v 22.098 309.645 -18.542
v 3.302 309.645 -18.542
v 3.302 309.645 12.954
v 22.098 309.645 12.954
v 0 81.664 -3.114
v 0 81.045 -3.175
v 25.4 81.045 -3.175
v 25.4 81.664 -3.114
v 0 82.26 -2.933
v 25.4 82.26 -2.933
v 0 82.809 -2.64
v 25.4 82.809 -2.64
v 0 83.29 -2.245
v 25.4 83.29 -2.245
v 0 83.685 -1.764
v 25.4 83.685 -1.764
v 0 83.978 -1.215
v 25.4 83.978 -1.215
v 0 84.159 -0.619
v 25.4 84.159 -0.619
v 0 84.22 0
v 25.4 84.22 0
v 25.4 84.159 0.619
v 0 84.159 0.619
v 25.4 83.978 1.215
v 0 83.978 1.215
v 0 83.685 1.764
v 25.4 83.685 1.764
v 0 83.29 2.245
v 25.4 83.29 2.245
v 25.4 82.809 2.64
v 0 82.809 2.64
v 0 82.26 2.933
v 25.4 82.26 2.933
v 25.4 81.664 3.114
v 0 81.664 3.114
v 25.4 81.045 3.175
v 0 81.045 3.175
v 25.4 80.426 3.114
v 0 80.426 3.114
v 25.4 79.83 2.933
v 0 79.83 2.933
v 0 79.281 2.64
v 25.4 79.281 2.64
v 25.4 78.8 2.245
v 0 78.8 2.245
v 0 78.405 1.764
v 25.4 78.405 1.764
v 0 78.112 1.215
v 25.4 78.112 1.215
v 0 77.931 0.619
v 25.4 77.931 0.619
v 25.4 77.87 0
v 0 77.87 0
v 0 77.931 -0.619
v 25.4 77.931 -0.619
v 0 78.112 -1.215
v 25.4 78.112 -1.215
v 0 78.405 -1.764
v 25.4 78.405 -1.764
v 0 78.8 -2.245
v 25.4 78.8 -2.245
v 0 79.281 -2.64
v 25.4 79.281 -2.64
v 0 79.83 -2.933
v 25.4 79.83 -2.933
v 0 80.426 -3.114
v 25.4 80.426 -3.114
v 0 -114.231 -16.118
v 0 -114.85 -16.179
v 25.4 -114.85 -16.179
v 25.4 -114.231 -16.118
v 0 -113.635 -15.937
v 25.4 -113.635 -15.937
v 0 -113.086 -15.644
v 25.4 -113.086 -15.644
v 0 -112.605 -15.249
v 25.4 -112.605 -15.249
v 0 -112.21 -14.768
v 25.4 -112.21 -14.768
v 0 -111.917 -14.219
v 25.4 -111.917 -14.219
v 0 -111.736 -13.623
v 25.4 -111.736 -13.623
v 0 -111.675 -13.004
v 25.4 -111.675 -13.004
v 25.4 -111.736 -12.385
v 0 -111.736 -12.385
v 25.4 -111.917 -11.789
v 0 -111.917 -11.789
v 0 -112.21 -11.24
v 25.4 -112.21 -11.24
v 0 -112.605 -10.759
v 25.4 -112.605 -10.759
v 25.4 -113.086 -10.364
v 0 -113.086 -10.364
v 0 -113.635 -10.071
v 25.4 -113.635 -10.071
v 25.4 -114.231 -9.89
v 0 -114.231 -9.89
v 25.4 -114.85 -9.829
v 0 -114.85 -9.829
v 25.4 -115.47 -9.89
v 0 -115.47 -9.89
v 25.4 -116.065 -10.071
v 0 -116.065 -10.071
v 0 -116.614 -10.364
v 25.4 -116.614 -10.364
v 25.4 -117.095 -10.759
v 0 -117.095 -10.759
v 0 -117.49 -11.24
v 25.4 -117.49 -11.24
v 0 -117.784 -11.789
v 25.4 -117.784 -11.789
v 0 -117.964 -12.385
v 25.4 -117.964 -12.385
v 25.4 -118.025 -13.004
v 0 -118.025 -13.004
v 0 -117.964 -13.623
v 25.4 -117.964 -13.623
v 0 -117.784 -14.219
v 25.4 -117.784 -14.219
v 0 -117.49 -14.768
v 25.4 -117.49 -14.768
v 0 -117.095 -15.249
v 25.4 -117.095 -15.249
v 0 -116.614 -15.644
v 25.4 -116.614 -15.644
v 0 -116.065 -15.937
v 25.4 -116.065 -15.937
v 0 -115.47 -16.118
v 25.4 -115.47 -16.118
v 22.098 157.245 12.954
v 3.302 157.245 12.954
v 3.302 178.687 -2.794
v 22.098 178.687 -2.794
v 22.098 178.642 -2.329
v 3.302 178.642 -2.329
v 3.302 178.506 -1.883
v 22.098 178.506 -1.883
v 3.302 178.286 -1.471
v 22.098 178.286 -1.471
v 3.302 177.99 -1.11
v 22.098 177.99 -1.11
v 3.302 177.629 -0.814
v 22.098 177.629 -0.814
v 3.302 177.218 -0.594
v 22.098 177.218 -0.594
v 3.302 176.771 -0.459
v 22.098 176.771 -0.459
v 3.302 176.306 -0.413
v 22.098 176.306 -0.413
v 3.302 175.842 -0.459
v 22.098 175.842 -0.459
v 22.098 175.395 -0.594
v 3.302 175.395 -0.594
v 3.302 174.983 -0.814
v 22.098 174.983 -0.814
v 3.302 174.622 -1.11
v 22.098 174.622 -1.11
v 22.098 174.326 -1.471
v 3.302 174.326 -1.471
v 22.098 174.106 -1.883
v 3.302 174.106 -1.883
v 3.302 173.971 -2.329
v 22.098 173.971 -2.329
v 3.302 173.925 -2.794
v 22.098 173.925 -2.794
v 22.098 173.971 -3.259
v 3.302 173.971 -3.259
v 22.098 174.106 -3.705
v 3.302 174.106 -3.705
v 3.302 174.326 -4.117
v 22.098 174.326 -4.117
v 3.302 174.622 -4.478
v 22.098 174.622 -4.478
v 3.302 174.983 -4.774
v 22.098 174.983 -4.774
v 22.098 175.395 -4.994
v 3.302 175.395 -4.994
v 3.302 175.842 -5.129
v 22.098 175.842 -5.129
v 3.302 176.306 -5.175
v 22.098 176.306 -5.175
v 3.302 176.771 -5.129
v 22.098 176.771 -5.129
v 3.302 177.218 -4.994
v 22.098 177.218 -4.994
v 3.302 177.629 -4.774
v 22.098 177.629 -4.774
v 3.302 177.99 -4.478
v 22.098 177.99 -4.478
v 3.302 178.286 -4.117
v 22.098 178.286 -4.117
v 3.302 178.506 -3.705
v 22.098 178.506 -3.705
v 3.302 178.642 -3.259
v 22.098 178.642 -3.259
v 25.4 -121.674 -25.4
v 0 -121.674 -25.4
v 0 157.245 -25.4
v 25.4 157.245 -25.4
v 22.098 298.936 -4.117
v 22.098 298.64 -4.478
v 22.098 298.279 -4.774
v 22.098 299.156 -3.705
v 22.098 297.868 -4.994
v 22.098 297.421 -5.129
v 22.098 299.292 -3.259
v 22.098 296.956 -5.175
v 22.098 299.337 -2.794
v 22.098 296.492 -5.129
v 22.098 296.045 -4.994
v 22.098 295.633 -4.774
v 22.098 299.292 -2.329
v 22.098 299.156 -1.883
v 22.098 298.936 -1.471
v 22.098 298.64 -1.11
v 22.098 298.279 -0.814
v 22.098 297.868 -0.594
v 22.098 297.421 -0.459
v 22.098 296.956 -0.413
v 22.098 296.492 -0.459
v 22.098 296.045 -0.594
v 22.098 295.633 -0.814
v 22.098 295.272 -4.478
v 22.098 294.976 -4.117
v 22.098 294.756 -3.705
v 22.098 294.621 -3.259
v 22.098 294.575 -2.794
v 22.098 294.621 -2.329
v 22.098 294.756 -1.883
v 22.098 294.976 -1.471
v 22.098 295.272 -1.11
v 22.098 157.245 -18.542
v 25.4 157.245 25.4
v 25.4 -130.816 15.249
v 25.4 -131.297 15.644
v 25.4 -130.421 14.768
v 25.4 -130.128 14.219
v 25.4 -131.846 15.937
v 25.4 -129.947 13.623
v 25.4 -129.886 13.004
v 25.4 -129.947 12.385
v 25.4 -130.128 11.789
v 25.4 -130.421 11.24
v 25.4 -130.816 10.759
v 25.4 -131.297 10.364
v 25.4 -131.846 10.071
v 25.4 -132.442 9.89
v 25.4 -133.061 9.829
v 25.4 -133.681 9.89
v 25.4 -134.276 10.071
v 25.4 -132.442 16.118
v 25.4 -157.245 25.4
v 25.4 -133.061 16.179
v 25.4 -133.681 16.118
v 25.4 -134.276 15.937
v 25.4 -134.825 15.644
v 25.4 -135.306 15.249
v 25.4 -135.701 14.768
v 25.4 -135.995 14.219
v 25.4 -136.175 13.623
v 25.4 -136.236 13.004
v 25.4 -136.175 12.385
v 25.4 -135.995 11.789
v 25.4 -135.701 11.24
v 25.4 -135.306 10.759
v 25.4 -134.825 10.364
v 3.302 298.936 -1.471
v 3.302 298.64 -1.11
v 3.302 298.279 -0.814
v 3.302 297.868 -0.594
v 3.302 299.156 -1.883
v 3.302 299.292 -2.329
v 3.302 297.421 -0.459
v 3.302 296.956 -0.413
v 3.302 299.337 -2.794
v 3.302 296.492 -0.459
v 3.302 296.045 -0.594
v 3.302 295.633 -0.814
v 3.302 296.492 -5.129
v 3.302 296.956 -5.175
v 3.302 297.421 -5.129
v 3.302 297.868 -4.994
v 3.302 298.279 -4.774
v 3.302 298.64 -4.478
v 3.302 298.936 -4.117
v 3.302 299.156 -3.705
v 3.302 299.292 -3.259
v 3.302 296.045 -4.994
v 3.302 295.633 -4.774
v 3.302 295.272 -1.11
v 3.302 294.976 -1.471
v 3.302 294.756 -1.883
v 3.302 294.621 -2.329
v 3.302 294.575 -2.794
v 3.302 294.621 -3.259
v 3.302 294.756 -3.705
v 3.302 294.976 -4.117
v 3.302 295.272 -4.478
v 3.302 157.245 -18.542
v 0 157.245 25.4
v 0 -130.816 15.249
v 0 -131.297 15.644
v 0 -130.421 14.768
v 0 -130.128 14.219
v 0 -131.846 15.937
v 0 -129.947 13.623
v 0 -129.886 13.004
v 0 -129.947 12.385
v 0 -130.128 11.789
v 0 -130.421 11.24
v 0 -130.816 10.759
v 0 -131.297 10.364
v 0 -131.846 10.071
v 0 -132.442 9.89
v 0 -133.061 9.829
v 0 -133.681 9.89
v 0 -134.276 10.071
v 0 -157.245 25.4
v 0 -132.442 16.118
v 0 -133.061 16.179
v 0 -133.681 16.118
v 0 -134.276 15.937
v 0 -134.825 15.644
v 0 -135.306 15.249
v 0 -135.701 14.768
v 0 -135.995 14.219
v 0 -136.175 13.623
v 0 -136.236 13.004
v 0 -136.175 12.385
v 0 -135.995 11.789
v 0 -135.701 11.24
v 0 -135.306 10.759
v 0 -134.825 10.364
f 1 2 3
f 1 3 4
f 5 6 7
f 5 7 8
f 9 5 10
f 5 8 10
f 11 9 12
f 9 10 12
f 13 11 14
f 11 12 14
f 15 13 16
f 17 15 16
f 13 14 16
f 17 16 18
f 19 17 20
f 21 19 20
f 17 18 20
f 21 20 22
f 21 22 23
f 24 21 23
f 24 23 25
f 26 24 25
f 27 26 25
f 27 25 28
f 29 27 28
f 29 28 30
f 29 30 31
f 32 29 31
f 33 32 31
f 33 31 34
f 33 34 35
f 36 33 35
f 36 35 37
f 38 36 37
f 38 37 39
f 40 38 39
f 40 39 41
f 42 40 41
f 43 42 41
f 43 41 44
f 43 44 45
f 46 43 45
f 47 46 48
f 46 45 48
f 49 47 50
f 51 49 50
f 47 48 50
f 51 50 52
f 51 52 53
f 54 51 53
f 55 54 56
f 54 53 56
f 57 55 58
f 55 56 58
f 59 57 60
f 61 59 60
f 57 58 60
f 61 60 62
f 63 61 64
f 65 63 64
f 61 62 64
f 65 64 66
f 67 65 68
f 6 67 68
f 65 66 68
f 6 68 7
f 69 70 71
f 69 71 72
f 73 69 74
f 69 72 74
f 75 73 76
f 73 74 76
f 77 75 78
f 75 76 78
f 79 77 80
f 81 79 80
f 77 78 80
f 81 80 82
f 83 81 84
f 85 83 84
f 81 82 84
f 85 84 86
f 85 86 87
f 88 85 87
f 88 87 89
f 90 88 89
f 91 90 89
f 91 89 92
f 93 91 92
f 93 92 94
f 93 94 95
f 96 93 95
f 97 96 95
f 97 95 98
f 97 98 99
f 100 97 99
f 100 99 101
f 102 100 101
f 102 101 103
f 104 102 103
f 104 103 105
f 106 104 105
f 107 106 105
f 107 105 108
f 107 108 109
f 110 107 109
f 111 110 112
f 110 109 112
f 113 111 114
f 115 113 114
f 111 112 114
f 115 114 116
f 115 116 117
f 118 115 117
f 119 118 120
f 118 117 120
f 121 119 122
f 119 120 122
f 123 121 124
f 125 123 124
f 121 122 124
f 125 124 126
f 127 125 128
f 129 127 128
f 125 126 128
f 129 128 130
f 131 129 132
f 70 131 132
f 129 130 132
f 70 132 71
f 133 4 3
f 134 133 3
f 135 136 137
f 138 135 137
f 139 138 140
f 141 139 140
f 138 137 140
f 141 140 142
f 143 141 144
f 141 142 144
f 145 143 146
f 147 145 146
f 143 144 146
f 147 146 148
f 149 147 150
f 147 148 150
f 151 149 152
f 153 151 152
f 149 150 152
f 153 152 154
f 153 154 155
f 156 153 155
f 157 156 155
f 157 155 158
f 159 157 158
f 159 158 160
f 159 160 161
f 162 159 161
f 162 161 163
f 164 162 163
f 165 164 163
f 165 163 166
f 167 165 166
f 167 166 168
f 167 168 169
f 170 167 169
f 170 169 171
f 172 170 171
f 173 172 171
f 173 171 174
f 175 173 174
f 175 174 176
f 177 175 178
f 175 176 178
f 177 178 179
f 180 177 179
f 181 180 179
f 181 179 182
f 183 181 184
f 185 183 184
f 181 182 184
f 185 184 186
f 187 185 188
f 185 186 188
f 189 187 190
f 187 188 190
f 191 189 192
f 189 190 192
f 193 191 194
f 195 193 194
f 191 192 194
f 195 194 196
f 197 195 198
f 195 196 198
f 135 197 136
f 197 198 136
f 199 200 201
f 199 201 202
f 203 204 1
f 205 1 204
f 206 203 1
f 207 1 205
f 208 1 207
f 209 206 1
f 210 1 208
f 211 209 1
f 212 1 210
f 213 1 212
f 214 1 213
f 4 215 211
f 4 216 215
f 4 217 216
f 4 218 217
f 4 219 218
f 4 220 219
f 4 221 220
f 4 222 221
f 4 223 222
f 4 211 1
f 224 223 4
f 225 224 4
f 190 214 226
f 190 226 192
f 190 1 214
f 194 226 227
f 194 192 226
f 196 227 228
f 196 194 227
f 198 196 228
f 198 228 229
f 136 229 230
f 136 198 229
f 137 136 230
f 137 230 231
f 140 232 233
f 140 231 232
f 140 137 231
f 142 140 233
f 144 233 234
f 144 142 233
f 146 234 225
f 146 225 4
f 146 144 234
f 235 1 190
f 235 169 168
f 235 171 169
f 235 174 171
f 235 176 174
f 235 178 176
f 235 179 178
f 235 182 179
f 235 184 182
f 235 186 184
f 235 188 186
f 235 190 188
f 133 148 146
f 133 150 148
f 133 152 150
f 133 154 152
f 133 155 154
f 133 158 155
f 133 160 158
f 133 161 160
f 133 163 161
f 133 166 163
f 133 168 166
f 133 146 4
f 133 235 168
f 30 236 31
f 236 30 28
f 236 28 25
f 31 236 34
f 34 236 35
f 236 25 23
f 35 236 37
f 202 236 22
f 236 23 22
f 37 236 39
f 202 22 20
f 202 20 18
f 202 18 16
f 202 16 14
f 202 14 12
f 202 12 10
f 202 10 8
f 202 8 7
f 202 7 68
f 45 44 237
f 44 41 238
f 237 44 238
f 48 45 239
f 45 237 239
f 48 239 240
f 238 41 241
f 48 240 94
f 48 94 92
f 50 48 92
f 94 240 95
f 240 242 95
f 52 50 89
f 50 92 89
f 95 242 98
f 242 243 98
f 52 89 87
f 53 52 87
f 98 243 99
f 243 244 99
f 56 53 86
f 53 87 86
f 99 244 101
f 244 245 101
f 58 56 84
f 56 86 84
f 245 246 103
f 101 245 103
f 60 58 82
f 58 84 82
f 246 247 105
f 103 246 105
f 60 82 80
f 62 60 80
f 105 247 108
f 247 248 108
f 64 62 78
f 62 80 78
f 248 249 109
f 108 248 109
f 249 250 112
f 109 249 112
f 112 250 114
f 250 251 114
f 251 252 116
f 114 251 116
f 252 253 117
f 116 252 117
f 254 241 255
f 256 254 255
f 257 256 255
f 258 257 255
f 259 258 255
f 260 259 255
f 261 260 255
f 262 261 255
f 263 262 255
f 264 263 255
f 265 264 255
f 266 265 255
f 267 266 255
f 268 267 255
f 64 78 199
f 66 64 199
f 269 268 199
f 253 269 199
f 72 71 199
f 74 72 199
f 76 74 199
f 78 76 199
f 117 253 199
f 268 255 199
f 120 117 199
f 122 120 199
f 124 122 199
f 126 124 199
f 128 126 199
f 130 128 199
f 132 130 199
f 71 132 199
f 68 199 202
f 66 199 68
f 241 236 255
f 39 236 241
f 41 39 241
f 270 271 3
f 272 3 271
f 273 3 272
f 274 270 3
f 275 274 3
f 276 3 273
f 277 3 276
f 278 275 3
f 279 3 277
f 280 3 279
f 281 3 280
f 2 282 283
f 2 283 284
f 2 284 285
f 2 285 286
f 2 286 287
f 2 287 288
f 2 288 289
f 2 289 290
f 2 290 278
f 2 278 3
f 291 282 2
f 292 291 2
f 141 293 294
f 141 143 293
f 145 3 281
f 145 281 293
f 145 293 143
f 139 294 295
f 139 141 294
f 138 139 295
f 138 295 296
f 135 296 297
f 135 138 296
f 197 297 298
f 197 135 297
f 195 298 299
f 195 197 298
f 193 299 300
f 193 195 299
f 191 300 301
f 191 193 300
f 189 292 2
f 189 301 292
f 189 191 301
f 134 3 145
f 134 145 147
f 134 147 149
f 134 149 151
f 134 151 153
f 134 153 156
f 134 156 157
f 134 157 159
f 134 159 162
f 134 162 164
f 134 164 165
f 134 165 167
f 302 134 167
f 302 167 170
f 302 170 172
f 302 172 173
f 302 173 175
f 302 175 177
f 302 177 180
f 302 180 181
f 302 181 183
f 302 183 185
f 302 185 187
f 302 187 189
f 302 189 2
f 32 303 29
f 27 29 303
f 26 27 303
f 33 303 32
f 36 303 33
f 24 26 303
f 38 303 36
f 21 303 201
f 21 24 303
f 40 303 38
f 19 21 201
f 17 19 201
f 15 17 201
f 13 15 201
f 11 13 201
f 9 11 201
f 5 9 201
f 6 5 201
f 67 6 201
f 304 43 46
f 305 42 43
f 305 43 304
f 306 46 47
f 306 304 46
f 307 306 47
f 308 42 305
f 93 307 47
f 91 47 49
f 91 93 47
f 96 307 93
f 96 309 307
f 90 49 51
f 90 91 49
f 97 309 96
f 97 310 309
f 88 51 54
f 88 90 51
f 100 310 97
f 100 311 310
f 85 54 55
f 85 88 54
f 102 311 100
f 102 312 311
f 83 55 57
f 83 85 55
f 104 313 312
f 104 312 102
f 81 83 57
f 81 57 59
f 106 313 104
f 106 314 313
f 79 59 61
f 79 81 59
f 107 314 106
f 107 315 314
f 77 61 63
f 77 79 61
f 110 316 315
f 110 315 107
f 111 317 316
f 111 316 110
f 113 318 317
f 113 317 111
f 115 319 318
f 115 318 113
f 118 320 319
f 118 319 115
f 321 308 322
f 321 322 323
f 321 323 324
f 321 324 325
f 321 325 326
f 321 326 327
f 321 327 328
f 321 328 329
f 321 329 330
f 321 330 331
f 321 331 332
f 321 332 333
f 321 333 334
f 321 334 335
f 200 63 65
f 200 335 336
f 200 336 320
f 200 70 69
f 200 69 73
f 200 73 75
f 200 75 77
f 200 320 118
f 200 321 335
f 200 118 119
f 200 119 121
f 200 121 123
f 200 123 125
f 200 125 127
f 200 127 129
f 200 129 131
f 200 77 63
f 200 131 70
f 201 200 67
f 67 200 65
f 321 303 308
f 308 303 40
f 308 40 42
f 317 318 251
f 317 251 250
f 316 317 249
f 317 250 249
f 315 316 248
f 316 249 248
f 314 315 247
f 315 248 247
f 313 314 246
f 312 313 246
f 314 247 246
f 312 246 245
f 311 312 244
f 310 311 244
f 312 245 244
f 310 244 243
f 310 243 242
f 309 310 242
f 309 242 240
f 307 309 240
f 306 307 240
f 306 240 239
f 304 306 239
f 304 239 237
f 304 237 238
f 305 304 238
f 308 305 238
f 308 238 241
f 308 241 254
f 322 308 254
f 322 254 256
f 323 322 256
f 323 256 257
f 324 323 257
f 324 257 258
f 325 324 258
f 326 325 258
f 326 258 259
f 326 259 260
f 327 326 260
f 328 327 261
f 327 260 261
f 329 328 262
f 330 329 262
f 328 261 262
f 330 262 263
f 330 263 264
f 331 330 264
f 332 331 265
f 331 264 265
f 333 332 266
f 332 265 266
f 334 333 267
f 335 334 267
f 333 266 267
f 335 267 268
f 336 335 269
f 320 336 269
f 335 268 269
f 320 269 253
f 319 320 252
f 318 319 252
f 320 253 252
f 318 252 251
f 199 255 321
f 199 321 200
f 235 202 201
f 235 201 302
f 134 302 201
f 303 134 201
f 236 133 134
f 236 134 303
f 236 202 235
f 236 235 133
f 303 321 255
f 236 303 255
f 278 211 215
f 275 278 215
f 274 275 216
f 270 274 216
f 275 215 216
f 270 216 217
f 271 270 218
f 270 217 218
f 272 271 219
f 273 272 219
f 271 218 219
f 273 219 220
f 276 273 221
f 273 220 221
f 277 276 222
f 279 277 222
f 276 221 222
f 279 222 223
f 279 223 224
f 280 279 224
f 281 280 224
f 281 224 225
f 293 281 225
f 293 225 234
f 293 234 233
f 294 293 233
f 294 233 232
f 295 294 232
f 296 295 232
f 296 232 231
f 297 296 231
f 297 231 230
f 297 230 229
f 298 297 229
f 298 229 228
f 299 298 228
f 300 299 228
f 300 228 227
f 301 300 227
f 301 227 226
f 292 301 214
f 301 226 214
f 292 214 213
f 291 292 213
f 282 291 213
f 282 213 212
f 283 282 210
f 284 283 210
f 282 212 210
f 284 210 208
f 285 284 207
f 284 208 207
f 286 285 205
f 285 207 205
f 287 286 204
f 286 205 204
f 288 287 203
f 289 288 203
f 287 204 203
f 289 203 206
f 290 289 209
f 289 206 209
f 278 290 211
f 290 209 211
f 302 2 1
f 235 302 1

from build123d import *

# Parameters (mm, degrees)
SKETCH1_W               = 50.8
SKETCH1_H               = 314.489898324
BOSS_EXTRUDE1_DEPTH     = 25.4
CUT_EXTRUDE1_DEPTH      = 162.295672716
SKETCH3_R               = 3.175
CUT_EXTRUDE2_DEPTH      = 162.295672716
SKETCH6_W               = 25.4
SKETCH6_H               = 50.8
BOSS_EXTRUDE3_DEPTH     = 152.4
CUT_EXTRUDE4_DEPTH      = 312.721533651
CUT_EXTRUDE5_DEPTH      = 315.810728123
SKETCH5_R               = 2.38125
CUT_EXTRUDE3_DEPTH      = 312.543594923
CUT_EXTRUDE6_DEPTH      = 469.269684217
CUT_EXTRUDE6_DEPTH_BACK = 152.4
SKETCH9_R               = 29.953527753
SKETCH9_W               = 20.828
SKETCH9_H               = 33.528


with BuildPart() as part:
    # Sketch1 → Boss-Extrude1 (new body)
    with BuildSketch(Plane(origin=(0, 0, 0), x_dir=(0, 0, -1), z_dir=(1, 0, 0))):
        Rectangle(SKETCH1_W, SKETCH1_H)
    extrude(amount=BOSS_EXTRUDE1_DEPTH)

    # Sketch2 → Cut-Extrude1 (cut, through all)
    with BuildSketch(Plane(origin=(25.4, 0, 0), x_dir=(0, 0, -1), z_dir=(1, 0, 0))):
        Polygon((-25.4, -157.244949162), (25.4, -121.674406221), (50.8, -121.674406221), (50.8, -172.474406221), (-25.4, -172.474406221), align=None)
    extrude(amount=-CUT_EXTRUDE1_DEPTH, mode=Mode.SUBTRACT)

    # Sketch3 → Cut-Extrude2 (cut, through all)
    with BuildSketch(Plane(origin=(25.4, 0, 0), x_dir=(0, 0, -1), z_dir=(1, 0, 0))):
        with Locations((-13.004038703, -133.061366341)):
            Circle(SKETCH3_R)
        with Locations((13.004038703, -114.850314487)):
            Circle(SKETCH3_R)
        with Locations((0, 81.044949162)):
            Circle(SKETCH3_R)
    extrude(amount=-CUT_EXTRUDE2_DEPTH, mode=Mode.SUBTRACT)

    # Sketch6 → Boss-Extrude3 (add)
    with BuildSketch(Plane(origin=(0, 157.244949162, 0), x_dir=(1, 0, 0), z_dir=(0, 1, 0))):
        with Locations((12.7, 0)):
            Rectangle(SKETCH6_W, SKETCH6_H)
    extrude(amount=BOSS_EXTRUDE3_DEPTH)

    # Sketch7 → Cut-Extrude4 (cut, through all)
    with BuildSketch(Plane(origin=(25.4, 0, 0), x_dir=(0, 0, -1), z_dir=(1, 0, 0))):
        with BuildLine():
            Line((-25.4, 157.244949162), (-25.4, 309.644949162))
            Line((-25.4, 309.644949162), (-13.97, 309.644949162))
            Line((-13.97, 309.644949162), (-13.97, 163.594949162))
            ThreePointArc((-13.97, 163.594949162), (-15.829871939, 159.104821101), (-20.32, 157.244949162))
            Line((-20.32, 157.244949162), (-25.4, 157.244949162))
        make_face()
        with BuildLine():
            Line((39.293979998, 157.244949162), (25.908, 157.244949162))
            ThreePointArc((25.908, 157.244949162), (21.417871939, 159.104821101), (19.558, 163.594949162))
            Line((19.558, 163.594949162), (19.558, 309.644949162))
            Line((19.558, 309.644949162), (39.293979998, 309.644949162))
            Line((39.293979998, 309.644949162), (39.293979998, 157.244949162))
        make_face()
    extrude(amount=-CUT_EXTRUDE4_DEPTH, mode=Mode.SUBTRACT)

    # Sketch8 → Cut-Extrude5 (cut, through all)
    with BuildSketch(Plane.XY.offset(25.4)):
        with BuildLine():
            Line((2.286, 309.644949162), (-14.90160116, 309.644949162))
            Line((-14.90160116, 309.644949162), (-14.90160116, 157.244949162))
            Line((-14.90160116, 157.244949162), (-4.064, 157.244949162))
            ThreePointArc((-4.064, 157.244949162), (0.426128061, 159.104821101), (2.286, 163.594949162))
            Line((2.286, 163.594949162), (2.286, 309.644949162))
        make_face()
        with BuildLine():
            Line((23.114, 163.594949162), (23.114, 309.644949162))
            Line((23.114, 309.644949162), (40.983283112, 309.644949162))
            Line((40.983283112, 309.644949162), (40.983283112, 157.244949162))
            Line((40.983283112, 157.244949162), (29.464, 157.244949162))
            ThreePointArc((29.464, 157.244949162), (24.973871939, 159.104821101), (23.114, 163.594949162))
        make_face()
    extrude(amount=-CUT_EXTRUDE5_DEPTH, mode=Mode.SUBTRACT)

    # Sketch5 → Cut-Extrude3 (cut, through all)
    with BuildSketch(Plane(origin=(23.114, 0, 0), x_dir=(0, 0, -1), z_dir=(1, 0, 0))):
        with Locations(Location((2.794, 296.956244864, 0), (0, 0, 90))):
            Circle(SKETCH5_R)
        with Locations(Location((2.794, 176.306244864, 0), (0, 0, 90))):
            Circle(SKETCH5_R)
    extrude(amount=-CUT_EXTRUDE3_DEPTH, mode=Mode.SUBTRACT)

    # Sketch9 → Cut-Extrude6 (cut, two sides: drawn at the far end of the back side and taken through both)
    # profile 1 of 3: a face of its own
    with BuildSketch(Plane(origin=(0, 309.644949162, 0), x_dir=(1, 0, 0), z_dir=(0, 1, 0)).offset(-CUT_EXTRUDE6_DEPTH_BACK)):
        with Locations((12.7, 2.794)):
            Circle(SKETCH9_R)
        with Locations((12.7, 2.794)):
            Rectangle(SKETCH9_W, SKETCH9_H, mode=Mode.SUBTRACT)
    # profile 2 of 3: a face of its own
    with BuildSketch(Plane(origin=(0, 309.644949162, 0), x_dir=(1, 0, 0), z_dir=(0, 1, 0)).offset(-CUT_EXTRUDE6_DEPTH_BACK)):
        Polygon((3.302, 18.542), (12.7, 18.542), (12.7, 19.558), (2.286, 19.558), (2.286, -13.97), (12.7, -13.97), (12.7, -12.954), (3.302, -12.954), align=None)
    # profile 3 of 3: a face of its own
    with BuildSketch(Plane(origin=(0, 309.644949162, 0), x_dir=(1, 0, 0), z_dir=(0, 1, 0)).offset(-CUT_EXTRUDE6_DEPTH_BACK)):
        Polygon((12.7, 18.542), (22.098, 18.542), (22.098, 2.794), (22.098, -12.954), (12.7, -12.954), (12.7, -13.97), (23.114, -13.97), (23.114, 19.558), (12.7, 19.558), align=None)
    extrude(amount=CUT_EXTRUDE6_DEPTH + CUT_EXTRUDE6_DEPTH_BACK, mode=Mode.SUBTRACT)


solid = part.part
